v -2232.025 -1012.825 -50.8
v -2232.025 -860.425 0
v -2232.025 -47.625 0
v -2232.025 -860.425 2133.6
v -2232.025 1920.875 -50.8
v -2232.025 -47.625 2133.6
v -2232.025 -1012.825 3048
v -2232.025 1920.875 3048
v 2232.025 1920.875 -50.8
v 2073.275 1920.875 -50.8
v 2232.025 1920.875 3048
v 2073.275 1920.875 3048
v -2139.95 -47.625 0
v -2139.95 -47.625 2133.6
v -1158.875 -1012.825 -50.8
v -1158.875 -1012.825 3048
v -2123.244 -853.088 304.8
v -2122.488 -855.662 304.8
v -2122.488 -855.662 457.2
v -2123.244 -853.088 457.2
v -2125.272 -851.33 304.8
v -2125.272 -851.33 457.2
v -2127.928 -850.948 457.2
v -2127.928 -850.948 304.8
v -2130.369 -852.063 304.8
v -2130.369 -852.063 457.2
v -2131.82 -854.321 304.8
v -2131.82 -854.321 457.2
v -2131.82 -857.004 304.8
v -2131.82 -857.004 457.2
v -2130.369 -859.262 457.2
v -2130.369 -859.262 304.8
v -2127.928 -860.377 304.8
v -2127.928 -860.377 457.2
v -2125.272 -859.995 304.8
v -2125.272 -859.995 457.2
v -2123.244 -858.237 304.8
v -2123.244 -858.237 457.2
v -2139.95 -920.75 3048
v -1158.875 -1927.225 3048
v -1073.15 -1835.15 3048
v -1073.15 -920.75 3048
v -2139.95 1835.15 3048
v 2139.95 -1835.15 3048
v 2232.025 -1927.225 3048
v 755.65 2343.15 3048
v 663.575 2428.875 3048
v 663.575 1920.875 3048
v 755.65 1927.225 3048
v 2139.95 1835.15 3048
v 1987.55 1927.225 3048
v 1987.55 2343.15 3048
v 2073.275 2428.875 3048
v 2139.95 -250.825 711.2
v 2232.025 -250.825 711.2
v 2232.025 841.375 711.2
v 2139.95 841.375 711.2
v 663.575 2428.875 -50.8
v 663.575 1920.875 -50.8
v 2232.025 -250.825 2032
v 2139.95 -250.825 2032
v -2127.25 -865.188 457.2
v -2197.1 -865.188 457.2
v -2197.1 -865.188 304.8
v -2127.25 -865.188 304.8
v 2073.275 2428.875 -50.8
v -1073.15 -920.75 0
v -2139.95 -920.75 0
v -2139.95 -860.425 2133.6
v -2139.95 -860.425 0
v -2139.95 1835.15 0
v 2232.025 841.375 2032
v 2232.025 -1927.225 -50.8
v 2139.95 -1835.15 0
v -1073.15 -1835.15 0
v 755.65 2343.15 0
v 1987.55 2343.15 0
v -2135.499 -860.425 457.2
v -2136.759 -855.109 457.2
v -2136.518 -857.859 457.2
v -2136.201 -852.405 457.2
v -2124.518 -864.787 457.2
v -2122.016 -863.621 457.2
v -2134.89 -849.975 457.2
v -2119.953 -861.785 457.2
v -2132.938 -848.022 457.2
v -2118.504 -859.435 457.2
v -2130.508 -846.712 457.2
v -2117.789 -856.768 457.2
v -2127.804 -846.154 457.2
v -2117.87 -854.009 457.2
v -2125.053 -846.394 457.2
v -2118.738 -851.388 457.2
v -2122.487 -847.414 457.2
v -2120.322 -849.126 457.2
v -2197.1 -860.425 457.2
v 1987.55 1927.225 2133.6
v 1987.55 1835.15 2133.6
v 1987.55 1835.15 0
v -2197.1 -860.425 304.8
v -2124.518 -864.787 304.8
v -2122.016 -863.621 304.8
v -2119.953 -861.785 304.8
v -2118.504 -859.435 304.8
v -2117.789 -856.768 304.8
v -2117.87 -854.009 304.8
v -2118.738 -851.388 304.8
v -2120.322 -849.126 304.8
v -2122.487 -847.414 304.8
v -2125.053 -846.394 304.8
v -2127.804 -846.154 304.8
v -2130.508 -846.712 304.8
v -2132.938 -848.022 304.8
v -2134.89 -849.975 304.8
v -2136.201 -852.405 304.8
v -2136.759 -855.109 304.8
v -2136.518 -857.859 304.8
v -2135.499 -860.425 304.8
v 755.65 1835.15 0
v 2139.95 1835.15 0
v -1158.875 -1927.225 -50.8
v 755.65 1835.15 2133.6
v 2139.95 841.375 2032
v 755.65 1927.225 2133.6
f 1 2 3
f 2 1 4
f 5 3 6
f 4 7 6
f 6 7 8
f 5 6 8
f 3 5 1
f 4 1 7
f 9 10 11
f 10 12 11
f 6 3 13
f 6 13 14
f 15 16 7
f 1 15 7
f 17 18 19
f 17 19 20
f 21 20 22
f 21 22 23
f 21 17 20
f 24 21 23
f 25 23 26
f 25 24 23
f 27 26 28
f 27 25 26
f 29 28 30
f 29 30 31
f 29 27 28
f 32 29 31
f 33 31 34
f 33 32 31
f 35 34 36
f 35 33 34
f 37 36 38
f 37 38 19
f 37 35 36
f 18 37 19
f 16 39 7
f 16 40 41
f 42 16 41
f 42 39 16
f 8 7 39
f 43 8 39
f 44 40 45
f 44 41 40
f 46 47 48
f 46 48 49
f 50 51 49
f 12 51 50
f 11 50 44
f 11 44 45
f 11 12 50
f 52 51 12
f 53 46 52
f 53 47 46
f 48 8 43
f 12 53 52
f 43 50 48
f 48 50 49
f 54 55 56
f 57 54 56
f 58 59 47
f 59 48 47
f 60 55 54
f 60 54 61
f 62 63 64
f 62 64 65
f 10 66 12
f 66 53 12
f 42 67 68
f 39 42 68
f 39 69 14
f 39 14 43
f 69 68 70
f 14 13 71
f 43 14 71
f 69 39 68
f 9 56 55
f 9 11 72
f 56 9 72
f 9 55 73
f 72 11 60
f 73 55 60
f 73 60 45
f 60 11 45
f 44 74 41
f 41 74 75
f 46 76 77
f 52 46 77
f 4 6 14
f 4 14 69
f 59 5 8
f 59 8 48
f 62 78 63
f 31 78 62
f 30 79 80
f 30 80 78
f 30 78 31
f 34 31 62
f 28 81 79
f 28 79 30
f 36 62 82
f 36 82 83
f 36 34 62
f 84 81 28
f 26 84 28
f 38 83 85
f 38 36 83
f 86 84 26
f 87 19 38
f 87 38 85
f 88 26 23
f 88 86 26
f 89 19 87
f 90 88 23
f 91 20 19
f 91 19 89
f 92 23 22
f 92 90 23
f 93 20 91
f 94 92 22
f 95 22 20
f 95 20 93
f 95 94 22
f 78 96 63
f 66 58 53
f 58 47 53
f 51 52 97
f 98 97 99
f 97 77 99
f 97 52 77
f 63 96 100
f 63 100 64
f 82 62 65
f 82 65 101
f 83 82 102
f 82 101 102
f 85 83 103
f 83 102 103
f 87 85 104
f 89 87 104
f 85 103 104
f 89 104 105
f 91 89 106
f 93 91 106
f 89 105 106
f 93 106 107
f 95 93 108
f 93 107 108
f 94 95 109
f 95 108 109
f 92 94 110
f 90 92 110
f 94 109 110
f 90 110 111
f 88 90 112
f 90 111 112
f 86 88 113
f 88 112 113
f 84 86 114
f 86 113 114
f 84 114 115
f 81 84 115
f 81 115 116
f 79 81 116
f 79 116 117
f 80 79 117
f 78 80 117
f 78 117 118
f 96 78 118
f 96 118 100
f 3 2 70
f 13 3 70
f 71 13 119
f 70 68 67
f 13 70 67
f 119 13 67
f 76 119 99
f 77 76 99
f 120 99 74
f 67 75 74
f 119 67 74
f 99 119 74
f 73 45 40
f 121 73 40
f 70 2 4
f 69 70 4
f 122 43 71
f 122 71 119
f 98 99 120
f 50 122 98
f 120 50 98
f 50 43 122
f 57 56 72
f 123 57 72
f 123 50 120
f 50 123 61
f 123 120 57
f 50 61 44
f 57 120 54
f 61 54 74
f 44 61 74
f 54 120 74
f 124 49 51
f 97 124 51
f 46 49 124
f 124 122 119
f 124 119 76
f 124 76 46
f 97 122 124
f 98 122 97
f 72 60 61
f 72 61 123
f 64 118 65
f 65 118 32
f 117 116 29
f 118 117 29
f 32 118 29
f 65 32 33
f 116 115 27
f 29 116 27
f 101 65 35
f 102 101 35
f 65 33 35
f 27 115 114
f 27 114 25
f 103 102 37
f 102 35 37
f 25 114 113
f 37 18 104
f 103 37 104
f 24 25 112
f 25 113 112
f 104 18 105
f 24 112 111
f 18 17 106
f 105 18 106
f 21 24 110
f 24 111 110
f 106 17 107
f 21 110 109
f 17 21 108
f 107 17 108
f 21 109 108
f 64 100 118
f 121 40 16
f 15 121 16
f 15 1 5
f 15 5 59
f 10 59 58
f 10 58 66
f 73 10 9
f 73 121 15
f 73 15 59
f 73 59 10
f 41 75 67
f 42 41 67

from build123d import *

# Parameters (mm, degrees)
F1_DEPTH  = 3048
F2_W      = 1092.2
F2_H      = 1320.8
F3_DEPTH  = 101.6
F4_W      = 812.8
F4_H      = 2133.6
F5_DEPTH  = 101.6
F7_DEPTH  = 50.8
F8_W      = 1231.9
F8_H      = 914.4
F9_DEPTH  = 92.075
F11_R     = 4.7625
F12_DEPTH = 152.4


with BuildPart() as f1:
    # F0 (on Top) → F1 (new body)
    with BuildSketch(Plane.XY):
        Polygon((663.575, 2428.875), (663.575, 1920.875), (-2232.025, 1920.875), (-2232.025, -1012.825), (-1158.875, -1012.825), (-1158.875, -1927.225), (2232.025, -1927.225), (2232.025, 1920.875), (2073.275, 1920.875), (2073.275, 2428.875), align=None)
        Polygon((-2139.95, 1835.15), (755.65, 1835.15), (755.65, 2343.15), (1987.55, 2343.15), (1987.55, 1835.15), (2139.95, 1835.15), (2139.95, -1835.15), (-1073.15, -1835.15), (-1073.15, -920.75), (-2139.95, -920.75), align=None, mode=Mode.SUBTRACT)
    extrude(amount=F1_DEPTH)

    # F2 (on face) → F3 (cut)
    with BuildSketch(Plane.YZ.offset(2232.025)):
        with Locations((295.275, 1371.6)):
            Rectangle(F2_W, F2_H)
    extrude(amount=-F3_DEPTH, mode=Mode.SUBTRACT)

    # F4 (on face) → F5 (cut)
    with BuildSketch(Plane(origin=(-2232.025, 0, 0), x_dir=(0, -1, 0), z_dir=(-1, 0, 0))):
        with Locations((454.025, 1066.8)):
            Rectangle(F4_W, F4_H)
    extrude(amount=-F5_DEPTH, mode=Mode.SUBTRACT)

    # F6 (on face) → F7 (join)
    with BuildSketch(Plane(origin=(0, 0, 0), x_dir=(1, 0, 0), z_dir=(0, 0, -1))):
        Polygon((-1158.875, 1012.825), (-2232.025, 1012.825), (-2232.025, 860.425), (-2139.95, 860.425), (-2139.95, 920.75), (-1073.15, 920.75), (-1073.15, 1835.15), (2139.95, 1835.15), (2139.95, -1835.15), (1987.55, -1835.15), (1987.55, -2343.15), (755.65, -2343.15), (755.65, -1835.15), (-2139.95, -1835.15), (-2139.95, 47.625), (-2232.025, 47.625), (-2232.025, -1920.875), (663.575, -1920.875), (663.575, -2428.875), (2073.275, -2428.875), (2073.275, -1920.875), (2232.025, -1920.875), (2232.025, 1927.225), (-1158.875, 1927.225), align=None)
        Polygon((-2139.95, 860.425), (-2232.025, 860.425), (-2232.025, 47.625), (-2139.95, 47.625), (-2139.95, -1835.15), (755.65, -1835.15), (755.65, -2343.15), (1987.55, -2343.15), (1987.55, -1835.15), (2139.95, -1835.15), (2139.95, 1835.15), (-1073.15, 1835.15), (-1073.15, 920.75), (-2139.95, 920.75), align=None)
    extrude(amount=F7_DEPTH)

    # F8 (on face) → F9 (join)
    with BuildSketch(Plane.XZ.offset(-1835.15)):
        with Locations((1371.6, 2590.8)):
            Rectangle(F8_W, F8_H)
    extrude(amount=-F9_DEPTH)


with BuildPart() as f12:
    # F11 (on offset) → F12 (new body)
    with BuildSketch(Plane.XY.offset(304.8)):
        with BuildLine():
            Line((-2197.1, -860.425), (-2197.1, -865.1875))
            Line((-2197.1, -865.1875), (-2127.25, -865.1875))
            ThreePointArc((-2127.25, -865.1875), (-2122.4875, -847.413608029), (-2135.498891971, -860.425))
            Line((-2135.498891971, -860.425), (-2197.1, -860.425))
        make_face()
        with Locations((-2127.25, -855.6625)):
            Circle(F11_R, mode=Mode.SUBTRACT)
    extrude(amount=F12_DEPTH)


solid = Compound([f1.part, f12.part])
